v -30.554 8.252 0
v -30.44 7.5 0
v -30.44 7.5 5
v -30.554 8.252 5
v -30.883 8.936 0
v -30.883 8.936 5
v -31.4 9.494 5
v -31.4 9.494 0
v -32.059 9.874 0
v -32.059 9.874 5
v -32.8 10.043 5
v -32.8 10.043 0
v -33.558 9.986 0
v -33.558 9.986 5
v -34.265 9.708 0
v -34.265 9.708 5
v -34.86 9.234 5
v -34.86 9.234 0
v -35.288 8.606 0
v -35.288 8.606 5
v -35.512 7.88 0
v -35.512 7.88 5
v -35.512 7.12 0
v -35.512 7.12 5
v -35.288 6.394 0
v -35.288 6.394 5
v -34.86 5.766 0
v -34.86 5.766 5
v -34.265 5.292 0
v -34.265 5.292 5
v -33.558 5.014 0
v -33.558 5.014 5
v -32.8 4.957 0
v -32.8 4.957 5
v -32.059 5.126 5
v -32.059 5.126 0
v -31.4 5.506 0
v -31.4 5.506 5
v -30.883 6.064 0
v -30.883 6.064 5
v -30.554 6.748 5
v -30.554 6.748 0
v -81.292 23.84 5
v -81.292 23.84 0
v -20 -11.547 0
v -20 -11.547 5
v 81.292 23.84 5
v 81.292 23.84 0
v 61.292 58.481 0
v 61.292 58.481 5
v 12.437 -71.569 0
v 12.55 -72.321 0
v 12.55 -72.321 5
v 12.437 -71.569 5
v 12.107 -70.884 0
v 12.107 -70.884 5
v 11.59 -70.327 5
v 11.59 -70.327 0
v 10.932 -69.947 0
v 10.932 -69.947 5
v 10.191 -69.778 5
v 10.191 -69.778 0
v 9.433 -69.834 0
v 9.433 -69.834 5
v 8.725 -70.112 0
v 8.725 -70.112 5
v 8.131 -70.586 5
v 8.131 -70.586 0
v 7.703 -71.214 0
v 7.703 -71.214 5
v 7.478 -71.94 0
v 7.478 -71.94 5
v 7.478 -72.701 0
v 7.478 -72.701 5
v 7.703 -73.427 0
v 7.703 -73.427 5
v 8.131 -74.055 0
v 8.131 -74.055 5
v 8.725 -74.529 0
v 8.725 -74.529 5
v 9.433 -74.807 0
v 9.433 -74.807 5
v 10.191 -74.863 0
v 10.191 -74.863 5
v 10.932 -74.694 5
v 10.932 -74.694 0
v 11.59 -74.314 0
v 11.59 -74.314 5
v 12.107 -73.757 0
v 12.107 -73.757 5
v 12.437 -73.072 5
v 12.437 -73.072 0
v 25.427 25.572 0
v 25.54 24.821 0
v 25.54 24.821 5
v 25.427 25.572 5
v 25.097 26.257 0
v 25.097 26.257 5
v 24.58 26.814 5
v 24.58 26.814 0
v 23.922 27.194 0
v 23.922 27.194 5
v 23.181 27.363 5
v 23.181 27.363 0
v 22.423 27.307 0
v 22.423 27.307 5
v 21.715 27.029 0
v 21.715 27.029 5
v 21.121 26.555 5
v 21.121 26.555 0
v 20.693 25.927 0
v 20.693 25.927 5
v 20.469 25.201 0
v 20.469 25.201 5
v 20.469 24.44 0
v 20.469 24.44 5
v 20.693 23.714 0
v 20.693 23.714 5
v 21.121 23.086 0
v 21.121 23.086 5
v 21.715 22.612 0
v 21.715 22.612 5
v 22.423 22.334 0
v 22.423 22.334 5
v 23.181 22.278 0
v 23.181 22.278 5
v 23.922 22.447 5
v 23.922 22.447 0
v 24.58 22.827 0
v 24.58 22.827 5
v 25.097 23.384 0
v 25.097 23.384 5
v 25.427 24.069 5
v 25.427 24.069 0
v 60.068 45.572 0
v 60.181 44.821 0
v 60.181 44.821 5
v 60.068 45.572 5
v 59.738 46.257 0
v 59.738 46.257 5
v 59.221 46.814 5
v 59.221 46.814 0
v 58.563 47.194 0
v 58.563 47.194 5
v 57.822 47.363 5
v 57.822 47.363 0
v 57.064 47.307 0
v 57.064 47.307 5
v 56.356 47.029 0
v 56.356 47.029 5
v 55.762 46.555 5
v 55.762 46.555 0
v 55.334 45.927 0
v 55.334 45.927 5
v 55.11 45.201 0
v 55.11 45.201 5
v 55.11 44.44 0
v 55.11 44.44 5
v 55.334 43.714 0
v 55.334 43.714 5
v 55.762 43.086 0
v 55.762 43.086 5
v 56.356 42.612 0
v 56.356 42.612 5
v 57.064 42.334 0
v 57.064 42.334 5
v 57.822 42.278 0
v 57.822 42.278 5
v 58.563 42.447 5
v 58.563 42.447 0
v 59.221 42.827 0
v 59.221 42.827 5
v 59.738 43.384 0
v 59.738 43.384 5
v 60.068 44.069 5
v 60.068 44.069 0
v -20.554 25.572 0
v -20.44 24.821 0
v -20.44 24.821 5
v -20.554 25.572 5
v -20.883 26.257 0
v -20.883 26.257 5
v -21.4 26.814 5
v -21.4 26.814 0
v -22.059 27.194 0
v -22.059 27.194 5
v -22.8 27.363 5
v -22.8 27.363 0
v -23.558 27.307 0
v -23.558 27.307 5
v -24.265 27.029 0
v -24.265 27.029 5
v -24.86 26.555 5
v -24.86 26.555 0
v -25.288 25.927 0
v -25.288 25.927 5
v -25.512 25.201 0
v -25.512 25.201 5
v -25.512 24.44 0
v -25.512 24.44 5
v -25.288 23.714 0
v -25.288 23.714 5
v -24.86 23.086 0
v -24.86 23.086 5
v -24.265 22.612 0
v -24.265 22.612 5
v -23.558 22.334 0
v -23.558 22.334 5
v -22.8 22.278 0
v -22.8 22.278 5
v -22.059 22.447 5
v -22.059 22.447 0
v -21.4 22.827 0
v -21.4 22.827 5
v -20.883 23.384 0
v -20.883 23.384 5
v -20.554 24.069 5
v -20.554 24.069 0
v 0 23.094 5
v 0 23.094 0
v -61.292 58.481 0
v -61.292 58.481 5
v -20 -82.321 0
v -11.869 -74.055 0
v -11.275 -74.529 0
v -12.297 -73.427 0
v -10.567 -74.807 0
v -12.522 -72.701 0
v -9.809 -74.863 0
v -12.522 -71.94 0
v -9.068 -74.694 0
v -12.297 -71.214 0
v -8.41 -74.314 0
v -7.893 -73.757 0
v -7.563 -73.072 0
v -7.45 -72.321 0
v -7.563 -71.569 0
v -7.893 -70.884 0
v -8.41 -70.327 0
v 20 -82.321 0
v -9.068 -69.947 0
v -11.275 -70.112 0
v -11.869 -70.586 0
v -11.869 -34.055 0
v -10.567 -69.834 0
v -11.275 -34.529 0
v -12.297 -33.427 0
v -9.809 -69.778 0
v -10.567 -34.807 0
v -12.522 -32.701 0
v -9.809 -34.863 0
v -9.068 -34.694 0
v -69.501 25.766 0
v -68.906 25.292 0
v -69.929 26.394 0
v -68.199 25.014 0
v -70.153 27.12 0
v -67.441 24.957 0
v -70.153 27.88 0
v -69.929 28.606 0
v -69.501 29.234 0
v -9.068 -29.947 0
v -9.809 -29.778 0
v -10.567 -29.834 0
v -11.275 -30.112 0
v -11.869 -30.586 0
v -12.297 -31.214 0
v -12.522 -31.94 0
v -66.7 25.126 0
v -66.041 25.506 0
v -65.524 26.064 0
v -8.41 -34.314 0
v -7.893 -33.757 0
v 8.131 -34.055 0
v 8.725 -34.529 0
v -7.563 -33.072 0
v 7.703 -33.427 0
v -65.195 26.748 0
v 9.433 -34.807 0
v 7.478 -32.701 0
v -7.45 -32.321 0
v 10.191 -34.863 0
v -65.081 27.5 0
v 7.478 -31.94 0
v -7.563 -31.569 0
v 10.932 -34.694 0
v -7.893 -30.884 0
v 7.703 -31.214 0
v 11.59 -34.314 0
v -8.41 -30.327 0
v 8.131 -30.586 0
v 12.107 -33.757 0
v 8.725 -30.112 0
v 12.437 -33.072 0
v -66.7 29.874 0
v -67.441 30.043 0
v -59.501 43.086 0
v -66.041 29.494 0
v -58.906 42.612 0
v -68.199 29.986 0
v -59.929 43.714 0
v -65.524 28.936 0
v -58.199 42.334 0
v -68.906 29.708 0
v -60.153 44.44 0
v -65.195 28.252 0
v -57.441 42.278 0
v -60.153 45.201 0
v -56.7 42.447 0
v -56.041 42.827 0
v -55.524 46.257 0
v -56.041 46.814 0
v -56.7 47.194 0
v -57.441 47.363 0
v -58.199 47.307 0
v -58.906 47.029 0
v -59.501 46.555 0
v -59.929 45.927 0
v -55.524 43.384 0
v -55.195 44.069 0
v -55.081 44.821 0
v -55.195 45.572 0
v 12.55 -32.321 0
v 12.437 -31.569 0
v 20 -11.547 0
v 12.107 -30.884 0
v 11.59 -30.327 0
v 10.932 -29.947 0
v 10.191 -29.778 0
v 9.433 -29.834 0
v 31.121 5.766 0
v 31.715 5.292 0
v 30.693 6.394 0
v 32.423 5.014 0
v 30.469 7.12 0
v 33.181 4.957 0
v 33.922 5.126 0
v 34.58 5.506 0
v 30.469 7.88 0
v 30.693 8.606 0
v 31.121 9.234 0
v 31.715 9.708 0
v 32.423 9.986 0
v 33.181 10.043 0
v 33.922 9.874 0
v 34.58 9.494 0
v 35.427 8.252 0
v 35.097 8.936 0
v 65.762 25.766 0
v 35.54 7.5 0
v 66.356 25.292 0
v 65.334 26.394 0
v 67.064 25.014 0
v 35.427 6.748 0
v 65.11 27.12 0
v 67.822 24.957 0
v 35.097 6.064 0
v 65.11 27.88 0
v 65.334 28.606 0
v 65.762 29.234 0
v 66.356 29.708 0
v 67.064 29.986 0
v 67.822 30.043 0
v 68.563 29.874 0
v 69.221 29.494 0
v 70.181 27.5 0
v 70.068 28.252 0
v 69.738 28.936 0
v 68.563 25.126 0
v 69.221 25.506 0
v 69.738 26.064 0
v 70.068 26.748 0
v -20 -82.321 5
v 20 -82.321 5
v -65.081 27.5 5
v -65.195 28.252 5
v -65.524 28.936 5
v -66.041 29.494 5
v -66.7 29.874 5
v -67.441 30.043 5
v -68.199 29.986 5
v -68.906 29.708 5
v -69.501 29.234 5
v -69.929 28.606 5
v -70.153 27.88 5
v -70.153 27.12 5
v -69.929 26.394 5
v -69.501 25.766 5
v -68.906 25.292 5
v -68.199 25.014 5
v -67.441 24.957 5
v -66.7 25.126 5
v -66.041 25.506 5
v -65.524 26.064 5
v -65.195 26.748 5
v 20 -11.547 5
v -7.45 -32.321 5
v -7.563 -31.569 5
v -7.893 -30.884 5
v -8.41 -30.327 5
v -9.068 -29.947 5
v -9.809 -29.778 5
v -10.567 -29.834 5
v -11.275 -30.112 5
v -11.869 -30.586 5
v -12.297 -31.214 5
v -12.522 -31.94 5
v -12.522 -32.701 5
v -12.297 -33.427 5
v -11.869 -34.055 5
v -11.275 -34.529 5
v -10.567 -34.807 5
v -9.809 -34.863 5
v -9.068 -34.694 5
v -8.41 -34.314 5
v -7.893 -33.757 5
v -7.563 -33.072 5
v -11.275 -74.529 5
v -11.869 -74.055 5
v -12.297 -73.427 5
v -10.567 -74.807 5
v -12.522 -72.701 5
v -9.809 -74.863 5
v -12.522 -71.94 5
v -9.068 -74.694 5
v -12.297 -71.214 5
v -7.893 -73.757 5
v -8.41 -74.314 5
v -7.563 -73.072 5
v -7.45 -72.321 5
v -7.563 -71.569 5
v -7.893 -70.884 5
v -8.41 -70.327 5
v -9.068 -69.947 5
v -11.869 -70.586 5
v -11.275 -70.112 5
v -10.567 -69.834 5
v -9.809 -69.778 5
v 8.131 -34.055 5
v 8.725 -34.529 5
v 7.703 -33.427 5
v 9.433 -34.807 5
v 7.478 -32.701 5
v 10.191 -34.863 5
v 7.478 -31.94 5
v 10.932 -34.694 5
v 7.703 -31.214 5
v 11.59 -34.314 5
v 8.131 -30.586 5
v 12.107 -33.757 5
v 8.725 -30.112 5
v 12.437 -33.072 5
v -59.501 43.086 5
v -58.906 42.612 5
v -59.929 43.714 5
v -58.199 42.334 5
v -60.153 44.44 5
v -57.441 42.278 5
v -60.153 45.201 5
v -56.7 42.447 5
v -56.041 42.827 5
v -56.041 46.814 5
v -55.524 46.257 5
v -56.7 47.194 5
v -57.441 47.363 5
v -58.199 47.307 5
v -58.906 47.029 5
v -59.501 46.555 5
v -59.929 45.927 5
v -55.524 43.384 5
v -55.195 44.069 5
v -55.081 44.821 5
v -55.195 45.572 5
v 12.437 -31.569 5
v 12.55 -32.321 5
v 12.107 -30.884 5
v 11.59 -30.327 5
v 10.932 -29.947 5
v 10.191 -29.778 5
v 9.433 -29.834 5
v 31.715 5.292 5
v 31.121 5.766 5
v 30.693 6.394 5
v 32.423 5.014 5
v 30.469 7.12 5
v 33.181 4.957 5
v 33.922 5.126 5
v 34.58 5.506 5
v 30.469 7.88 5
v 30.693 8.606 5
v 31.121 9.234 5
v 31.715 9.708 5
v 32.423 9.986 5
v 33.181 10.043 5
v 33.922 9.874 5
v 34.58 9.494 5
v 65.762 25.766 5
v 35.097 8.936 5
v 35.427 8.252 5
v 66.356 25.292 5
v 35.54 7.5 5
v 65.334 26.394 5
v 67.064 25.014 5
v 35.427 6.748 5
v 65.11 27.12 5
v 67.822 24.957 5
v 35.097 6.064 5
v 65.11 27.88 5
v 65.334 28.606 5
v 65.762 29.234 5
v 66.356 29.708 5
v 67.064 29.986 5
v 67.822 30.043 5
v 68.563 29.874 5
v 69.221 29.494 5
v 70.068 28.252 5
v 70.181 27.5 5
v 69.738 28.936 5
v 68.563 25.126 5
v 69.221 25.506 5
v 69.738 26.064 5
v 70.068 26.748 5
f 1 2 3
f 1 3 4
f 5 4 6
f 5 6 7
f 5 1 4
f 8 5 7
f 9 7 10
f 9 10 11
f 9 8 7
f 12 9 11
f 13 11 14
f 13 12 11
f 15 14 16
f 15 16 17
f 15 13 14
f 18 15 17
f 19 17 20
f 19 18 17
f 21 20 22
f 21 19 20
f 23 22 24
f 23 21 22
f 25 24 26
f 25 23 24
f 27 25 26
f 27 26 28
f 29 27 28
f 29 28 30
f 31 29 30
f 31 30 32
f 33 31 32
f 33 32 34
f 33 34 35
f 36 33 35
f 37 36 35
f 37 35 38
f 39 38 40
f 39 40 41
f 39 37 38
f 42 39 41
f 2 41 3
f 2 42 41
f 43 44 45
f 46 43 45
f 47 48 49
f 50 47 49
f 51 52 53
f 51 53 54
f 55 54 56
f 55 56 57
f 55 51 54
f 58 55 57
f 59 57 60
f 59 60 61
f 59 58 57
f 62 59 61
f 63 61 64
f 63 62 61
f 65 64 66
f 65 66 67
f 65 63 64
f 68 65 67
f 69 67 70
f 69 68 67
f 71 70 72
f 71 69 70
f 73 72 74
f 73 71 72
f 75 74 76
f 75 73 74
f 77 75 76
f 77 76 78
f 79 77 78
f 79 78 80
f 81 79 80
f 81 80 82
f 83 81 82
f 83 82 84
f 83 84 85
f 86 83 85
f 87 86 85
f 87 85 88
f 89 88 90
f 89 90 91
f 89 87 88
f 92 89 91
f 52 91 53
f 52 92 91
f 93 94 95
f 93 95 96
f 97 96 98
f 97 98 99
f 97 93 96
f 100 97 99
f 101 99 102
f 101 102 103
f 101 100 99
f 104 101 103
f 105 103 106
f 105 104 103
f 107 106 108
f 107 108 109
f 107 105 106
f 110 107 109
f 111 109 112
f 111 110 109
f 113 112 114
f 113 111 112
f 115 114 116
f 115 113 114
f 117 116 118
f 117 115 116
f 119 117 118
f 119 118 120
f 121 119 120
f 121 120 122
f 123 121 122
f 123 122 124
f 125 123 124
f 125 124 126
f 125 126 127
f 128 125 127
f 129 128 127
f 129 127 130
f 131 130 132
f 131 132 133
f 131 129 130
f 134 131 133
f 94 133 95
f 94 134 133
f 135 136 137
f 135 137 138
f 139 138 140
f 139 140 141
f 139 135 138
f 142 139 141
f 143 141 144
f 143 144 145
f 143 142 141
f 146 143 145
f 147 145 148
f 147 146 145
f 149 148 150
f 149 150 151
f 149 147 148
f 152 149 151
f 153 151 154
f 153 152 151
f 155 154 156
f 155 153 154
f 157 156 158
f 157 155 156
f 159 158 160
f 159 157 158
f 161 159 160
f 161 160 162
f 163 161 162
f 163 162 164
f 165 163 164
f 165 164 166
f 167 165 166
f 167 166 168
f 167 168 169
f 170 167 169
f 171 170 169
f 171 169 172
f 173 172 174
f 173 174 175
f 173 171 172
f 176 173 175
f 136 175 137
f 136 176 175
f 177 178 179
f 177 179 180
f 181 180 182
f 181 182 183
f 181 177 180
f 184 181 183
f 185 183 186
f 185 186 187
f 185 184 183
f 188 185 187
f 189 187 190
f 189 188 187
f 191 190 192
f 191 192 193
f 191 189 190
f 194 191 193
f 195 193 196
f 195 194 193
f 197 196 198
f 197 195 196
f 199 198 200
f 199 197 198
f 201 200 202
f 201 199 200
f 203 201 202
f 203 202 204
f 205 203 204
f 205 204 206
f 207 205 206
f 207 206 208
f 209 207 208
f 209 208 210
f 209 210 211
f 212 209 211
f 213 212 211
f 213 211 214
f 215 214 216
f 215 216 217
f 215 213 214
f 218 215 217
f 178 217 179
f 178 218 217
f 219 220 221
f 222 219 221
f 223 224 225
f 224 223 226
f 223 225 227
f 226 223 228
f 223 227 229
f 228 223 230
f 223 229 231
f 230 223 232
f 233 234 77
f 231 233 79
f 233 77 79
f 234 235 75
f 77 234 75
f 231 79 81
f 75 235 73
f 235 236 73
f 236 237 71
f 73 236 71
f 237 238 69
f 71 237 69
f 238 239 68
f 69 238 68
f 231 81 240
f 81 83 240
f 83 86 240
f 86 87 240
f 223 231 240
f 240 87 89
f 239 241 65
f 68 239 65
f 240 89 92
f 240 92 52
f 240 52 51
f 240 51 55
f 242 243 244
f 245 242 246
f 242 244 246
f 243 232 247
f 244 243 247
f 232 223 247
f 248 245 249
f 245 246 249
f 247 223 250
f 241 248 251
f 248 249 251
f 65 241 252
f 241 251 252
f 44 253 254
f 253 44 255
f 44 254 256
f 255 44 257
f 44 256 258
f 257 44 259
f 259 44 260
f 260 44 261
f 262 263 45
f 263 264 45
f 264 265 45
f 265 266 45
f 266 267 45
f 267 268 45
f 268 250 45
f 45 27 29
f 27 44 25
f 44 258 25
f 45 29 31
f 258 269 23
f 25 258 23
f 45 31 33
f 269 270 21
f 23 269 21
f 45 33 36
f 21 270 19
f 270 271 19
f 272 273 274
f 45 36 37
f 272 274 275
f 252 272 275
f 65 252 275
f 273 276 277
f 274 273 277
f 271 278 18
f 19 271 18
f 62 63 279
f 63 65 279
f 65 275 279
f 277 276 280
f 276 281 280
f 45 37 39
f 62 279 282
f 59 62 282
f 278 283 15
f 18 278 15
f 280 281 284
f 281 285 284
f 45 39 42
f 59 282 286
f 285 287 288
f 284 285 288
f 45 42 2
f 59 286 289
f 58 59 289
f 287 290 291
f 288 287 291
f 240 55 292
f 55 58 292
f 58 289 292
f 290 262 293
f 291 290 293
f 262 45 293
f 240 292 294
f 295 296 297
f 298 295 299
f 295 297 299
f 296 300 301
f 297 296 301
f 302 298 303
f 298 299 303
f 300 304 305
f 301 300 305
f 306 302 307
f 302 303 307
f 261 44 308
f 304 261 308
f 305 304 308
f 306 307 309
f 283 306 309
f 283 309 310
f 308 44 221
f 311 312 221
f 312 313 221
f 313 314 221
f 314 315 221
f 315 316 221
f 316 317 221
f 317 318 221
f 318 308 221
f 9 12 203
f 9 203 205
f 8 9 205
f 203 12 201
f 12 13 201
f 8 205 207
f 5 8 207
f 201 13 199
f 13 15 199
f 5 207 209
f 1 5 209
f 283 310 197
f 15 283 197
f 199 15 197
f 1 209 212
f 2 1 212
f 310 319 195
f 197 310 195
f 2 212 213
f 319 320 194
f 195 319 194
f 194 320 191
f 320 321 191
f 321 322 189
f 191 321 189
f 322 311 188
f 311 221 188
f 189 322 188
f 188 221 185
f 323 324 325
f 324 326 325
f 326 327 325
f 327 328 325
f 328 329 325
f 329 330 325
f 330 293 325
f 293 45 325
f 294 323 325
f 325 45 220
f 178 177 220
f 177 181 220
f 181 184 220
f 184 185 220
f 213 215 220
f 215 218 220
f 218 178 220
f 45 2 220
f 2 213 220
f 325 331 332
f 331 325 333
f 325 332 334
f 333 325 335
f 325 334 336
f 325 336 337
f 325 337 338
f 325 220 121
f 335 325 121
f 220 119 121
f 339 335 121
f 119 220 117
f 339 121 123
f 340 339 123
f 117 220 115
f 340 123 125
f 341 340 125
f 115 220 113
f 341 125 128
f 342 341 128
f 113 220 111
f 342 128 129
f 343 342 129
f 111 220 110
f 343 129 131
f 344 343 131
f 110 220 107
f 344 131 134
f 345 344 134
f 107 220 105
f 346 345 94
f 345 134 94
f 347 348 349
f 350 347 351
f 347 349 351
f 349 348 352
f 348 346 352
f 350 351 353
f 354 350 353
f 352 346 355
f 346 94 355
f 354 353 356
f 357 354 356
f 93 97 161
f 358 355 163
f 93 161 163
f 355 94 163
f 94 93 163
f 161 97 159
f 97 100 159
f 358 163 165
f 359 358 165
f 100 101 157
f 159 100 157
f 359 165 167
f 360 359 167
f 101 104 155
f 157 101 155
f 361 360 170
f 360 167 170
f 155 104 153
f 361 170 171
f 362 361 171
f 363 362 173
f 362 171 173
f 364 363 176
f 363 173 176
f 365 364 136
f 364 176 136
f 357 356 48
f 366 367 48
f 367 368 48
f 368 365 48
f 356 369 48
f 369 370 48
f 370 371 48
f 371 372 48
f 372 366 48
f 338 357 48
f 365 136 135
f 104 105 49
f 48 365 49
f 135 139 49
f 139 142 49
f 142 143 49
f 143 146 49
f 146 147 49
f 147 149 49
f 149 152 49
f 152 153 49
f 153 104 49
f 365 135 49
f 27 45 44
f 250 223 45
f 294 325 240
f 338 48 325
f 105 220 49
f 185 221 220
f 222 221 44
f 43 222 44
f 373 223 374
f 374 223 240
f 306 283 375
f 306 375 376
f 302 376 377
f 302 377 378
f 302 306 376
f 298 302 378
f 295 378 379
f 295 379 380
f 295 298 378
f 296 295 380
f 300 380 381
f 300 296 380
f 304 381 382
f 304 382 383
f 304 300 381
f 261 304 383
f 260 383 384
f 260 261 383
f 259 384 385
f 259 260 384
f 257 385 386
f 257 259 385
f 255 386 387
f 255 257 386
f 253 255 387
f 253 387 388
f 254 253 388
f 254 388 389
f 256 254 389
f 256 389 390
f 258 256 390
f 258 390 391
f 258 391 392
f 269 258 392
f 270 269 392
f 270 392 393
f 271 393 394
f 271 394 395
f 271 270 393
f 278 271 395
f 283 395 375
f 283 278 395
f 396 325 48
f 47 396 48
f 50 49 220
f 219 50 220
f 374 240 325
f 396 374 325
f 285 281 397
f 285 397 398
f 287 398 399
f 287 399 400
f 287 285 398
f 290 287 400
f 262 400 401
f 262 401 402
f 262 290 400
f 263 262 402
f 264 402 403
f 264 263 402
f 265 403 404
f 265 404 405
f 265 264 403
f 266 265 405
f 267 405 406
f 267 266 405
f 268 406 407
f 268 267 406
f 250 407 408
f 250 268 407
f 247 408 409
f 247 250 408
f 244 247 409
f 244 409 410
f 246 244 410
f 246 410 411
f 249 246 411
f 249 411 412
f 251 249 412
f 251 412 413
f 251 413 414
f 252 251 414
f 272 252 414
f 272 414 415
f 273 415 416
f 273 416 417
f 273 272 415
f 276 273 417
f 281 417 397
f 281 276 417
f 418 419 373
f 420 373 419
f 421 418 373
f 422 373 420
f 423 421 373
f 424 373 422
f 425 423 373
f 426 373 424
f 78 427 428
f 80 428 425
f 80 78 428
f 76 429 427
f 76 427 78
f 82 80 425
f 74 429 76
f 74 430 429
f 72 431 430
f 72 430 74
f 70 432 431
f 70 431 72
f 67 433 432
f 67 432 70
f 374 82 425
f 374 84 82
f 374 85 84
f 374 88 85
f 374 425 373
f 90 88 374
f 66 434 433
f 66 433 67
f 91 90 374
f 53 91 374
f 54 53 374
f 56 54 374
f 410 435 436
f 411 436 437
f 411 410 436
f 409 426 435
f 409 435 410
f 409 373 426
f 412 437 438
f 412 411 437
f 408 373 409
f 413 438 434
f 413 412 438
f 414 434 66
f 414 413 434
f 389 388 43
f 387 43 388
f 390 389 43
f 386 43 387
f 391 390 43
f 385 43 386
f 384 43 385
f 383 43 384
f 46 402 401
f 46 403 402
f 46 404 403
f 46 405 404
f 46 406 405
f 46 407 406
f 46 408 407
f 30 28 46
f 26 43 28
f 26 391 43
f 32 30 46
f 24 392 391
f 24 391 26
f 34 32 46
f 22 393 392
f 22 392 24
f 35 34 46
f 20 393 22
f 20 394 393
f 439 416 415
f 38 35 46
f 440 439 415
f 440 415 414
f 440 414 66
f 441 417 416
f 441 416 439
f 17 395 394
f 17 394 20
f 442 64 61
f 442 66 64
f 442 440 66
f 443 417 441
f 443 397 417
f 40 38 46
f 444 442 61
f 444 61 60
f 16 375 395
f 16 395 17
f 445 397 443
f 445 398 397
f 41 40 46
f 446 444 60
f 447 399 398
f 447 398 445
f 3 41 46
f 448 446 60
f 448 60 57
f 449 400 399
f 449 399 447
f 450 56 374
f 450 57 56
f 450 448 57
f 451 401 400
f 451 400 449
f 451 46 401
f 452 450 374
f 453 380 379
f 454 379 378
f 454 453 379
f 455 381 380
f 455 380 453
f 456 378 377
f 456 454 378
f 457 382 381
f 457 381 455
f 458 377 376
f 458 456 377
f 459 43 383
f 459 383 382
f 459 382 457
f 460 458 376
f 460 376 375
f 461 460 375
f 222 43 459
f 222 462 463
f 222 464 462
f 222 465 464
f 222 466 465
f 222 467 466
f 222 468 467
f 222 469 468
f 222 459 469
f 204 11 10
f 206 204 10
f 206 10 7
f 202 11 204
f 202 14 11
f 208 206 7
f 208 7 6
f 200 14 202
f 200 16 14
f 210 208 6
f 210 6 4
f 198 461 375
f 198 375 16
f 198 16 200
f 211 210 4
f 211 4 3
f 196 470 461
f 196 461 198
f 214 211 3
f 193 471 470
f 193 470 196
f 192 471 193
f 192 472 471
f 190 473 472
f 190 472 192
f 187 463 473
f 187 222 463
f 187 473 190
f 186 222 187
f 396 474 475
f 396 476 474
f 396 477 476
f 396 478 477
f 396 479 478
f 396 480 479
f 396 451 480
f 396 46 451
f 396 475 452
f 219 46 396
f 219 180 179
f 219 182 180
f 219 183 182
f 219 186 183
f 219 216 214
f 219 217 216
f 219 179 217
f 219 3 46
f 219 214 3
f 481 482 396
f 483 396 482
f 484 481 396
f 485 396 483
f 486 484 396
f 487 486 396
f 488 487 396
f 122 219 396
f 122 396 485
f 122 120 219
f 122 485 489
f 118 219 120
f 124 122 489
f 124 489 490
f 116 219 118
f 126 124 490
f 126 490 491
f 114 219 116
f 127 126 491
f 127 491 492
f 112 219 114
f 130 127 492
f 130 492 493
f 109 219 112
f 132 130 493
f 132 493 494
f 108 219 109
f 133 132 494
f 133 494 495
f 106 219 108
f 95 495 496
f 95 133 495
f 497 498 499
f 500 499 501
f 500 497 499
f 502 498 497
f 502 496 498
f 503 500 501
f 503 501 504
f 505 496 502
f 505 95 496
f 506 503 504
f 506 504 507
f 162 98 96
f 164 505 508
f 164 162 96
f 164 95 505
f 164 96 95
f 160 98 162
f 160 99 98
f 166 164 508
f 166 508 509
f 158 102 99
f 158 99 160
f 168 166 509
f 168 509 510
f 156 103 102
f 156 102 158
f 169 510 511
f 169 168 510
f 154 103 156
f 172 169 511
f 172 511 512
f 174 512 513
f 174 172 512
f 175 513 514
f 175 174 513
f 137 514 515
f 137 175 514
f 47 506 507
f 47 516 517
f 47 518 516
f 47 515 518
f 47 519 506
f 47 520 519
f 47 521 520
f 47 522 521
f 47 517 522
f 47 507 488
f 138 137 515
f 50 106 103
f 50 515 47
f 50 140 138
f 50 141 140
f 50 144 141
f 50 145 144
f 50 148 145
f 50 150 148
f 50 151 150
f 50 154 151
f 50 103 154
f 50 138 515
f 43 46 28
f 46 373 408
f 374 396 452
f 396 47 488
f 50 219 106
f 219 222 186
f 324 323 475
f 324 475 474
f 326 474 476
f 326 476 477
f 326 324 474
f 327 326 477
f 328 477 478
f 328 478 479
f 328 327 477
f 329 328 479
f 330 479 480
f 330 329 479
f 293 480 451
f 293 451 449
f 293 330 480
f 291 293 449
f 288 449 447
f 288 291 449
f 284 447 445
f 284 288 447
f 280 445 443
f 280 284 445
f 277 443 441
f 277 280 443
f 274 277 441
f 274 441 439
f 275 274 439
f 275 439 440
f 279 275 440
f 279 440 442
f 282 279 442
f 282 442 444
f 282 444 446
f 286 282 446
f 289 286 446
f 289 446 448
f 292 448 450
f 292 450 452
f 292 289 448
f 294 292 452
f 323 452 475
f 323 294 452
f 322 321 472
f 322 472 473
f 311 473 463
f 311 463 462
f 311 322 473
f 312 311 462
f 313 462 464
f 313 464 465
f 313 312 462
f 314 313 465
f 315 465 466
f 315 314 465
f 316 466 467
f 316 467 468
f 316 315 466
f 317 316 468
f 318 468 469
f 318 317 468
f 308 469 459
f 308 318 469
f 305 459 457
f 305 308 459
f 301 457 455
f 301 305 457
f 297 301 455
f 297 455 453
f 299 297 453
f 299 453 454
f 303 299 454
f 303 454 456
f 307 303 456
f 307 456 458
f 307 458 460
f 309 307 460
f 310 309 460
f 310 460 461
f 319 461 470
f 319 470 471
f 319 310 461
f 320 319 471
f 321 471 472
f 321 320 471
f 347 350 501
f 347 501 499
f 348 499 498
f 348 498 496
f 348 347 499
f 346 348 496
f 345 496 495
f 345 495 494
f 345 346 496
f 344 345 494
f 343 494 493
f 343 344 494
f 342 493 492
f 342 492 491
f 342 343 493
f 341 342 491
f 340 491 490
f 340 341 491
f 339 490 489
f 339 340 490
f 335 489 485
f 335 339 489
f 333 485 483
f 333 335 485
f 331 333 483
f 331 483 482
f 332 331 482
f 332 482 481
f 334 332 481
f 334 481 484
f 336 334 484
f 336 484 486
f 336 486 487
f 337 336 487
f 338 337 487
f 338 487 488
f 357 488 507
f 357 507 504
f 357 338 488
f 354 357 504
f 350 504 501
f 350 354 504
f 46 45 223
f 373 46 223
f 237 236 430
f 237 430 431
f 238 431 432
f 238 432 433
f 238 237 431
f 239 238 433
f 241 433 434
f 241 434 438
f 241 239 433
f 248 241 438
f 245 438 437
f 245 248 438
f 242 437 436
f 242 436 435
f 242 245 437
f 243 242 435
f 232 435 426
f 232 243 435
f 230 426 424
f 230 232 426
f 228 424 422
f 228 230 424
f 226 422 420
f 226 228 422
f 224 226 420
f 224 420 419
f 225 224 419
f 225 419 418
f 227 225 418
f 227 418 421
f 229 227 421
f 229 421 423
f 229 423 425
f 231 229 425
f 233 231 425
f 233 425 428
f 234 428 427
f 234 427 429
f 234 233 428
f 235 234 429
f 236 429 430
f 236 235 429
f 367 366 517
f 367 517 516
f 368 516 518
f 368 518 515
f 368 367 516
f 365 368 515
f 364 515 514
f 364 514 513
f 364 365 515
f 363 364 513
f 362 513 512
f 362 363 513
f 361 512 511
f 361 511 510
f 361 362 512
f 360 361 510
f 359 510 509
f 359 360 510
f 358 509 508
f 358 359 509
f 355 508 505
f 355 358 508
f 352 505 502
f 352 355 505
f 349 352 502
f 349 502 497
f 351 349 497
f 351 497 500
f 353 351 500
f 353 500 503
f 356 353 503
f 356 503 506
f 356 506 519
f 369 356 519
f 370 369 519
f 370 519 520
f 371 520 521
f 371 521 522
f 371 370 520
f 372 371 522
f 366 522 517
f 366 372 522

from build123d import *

# Parameters (mm, degrees)
F0_R     = 2.55
F1_DEPTH = 5


with BuildPart() as f1:
    # F0 (on Top) → F1 (new body)
    with BuildSketch(Plane.XY):
        Polygon((-61.291651, 58.480762), (-81.291651, 23.839746), (-20, -11.547005), (-20, -82.320508), (20, -82.320508), (20, -11.547005), (81.291651, 23.839746), (61.291651, 58.480762), (0, 23.094011), align=None)
        with Locations((-10, -72.320508)):
            Circle(F0_R, mode=Mode.SUBTRACT)
        with Locations((-10, -32.320508)):
            Circle(F0_R, mode=Mode.SUBTRACT)
        with Locations((10, -72.320508)):
            Circle(F0_R, mode=Mode.SUBTRACT)
        with Locations((10, -32.320508)):
            Circle(F0_R, mode=Mode.SUBTRACT)
        with Locations((-67.631397, 27.5)):
            Circle(F0_R, mode=Mode.SUBTRACT)
        with Locations((-32.990381, 7.5)):
            Circle(F0_R, mode=Mode.SUBTRACT)
        with Locations((-22.990381, 24.820508)):
            Circle(F0_R, mode=Mode.SUBTRACT)
        with Locations((-57.631397, 44.820508)):
            Circle(F0_R, mode=Mode.SUBTRACT)
        with Locations((32.990381, 7.5)):
            Circle(F0_R, mode=Mode.SUBTRACT)
        with Locations((22.990381, 24.820508)):
            Circle(F0_R, mode=Mode.SUBTRACT)
        with Locations((67.631397, 27.5)):
            Circle(F0_R, mode=Mode.SUBTRACT)
        with Locations((57.631397, 44.820508)):
            Circle(F0_R, mode=Mode.SUBTRACT)
    extrude(amount=F1_DEPTH)


solid = f1.part
